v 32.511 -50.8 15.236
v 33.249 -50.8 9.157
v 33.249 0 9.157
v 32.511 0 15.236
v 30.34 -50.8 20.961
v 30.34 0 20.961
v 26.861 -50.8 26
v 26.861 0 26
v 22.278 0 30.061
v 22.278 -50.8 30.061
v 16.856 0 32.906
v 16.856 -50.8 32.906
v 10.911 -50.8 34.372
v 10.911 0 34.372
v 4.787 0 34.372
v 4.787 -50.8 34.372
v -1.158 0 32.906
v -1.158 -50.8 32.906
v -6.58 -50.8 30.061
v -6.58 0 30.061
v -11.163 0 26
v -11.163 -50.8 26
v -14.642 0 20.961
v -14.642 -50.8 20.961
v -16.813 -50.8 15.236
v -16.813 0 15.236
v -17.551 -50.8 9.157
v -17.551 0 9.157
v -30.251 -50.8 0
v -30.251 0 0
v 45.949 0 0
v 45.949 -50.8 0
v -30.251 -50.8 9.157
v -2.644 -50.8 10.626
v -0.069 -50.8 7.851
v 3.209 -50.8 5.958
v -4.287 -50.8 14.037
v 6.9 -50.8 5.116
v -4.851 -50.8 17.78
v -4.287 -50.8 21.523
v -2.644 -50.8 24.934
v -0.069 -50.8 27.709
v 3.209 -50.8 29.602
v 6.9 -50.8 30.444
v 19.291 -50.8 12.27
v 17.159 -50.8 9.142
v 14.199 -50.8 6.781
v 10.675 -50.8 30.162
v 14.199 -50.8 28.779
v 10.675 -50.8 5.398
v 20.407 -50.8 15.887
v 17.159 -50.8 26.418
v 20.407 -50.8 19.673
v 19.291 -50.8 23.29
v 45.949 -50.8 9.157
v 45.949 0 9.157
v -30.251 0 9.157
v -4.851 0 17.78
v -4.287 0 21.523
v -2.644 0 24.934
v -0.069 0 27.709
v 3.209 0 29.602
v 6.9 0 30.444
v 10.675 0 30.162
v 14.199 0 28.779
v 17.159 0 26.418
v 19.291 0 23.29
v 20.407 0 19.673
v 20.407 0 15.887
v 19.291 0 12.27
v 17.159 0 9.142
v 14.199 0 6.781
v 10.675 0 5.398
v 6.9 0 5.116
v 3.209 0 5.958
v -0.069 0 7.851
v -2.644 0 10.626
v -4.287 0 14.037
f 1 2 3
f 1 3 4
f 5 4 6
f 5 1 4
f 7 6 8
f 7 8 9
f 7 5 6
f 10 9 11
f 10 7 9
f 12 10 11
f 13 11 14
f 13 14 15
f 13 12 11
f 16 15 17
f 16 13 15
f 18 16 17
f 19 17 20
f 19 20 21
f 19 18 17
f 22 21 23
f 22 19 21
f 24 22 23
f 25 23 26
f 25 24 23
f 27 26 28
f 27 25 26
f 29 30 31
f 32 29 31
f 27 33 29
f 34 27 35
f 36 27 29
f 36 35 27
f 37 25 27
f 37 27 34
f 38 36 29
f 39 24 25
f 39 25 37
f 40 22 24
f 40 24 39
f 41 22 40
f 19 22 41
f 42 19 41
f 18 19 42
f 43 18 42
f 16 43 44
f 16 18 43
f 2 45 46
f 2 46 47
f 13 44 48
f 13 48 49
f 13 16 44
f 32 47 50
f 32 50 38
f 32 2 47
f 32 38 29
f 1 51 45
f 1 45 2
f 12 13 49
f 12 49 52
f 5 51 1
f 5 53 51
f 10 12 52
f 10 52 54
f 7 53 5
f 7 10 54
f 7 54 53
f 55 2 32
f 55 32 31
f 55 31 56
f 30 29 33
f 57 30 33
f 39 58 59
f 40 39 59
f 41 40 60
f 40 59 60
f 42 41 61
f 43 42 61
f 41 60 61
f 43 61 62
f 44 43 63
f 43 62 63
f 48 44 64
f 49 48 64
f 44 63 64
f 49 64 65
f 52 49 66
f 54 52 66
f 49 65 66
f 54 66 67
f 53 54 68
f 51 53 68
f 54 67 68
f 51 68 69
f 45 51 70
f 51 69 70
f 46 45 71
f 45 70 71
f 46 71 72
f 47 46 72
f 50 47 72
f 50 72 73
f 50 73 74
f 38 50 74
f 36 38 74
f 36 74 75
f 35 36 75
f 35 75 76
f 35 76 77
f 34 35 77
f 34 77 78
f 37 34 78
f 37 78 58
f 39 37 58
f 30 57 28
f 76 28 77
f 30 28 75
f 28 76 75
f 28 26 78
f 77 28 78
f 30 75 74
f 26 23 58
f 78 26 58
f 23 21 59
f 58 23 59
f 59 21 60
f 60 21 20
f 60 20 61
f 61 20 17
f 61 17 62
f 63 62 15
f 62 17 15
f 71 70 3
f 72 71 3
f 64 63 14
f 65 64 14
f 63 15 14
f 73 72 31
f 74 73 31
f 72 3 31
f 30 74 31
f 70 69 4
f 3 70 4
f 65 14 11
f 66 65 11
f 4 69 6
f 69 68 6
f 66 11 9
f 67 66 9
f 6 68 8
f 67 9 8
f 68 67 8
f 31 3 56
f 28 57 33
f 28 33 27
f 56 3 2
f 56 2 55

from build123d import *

# Parameters (mm, degrees)
F0_W     = 76.2
F0_H     = 9.1570811439
F1_DEPTH = 50.8
F3_DEPTH = 50.8
F5_D     = 25.4


with BuildPart() as f1:
    # F0 (on Front) → F1 (new body)
    with BuildSketch(Plane.XZ):
        with Locations((7.8489261553, 4.578540572)):
            Rectangle(F0_W, F0_H)
    extrude(amount=F1_DEPTH)

    # F2 (on face) → F3 (join)
    with BuildSketch(Plane.XZ.offset(50.8)):
        with BuildLine():
            Line((-17.5510738447, 9.1570811439), (33.2489261553, 9.1570811439))
            ThreePointArc((33.2489261553, 9.1570811439), (7.8489261553, 34.5570811439), (-17.5510738447, 9.1570811439))
        make_face()
    extrude(amount=-F3_DEPTH)

    # F5 (through all)
    with Locations(Plane.XZ.offset(50.8)):
        with Locations((7.8489261553, 17.78)):
            Hole(F5_D / 2)


solid = f1.part
